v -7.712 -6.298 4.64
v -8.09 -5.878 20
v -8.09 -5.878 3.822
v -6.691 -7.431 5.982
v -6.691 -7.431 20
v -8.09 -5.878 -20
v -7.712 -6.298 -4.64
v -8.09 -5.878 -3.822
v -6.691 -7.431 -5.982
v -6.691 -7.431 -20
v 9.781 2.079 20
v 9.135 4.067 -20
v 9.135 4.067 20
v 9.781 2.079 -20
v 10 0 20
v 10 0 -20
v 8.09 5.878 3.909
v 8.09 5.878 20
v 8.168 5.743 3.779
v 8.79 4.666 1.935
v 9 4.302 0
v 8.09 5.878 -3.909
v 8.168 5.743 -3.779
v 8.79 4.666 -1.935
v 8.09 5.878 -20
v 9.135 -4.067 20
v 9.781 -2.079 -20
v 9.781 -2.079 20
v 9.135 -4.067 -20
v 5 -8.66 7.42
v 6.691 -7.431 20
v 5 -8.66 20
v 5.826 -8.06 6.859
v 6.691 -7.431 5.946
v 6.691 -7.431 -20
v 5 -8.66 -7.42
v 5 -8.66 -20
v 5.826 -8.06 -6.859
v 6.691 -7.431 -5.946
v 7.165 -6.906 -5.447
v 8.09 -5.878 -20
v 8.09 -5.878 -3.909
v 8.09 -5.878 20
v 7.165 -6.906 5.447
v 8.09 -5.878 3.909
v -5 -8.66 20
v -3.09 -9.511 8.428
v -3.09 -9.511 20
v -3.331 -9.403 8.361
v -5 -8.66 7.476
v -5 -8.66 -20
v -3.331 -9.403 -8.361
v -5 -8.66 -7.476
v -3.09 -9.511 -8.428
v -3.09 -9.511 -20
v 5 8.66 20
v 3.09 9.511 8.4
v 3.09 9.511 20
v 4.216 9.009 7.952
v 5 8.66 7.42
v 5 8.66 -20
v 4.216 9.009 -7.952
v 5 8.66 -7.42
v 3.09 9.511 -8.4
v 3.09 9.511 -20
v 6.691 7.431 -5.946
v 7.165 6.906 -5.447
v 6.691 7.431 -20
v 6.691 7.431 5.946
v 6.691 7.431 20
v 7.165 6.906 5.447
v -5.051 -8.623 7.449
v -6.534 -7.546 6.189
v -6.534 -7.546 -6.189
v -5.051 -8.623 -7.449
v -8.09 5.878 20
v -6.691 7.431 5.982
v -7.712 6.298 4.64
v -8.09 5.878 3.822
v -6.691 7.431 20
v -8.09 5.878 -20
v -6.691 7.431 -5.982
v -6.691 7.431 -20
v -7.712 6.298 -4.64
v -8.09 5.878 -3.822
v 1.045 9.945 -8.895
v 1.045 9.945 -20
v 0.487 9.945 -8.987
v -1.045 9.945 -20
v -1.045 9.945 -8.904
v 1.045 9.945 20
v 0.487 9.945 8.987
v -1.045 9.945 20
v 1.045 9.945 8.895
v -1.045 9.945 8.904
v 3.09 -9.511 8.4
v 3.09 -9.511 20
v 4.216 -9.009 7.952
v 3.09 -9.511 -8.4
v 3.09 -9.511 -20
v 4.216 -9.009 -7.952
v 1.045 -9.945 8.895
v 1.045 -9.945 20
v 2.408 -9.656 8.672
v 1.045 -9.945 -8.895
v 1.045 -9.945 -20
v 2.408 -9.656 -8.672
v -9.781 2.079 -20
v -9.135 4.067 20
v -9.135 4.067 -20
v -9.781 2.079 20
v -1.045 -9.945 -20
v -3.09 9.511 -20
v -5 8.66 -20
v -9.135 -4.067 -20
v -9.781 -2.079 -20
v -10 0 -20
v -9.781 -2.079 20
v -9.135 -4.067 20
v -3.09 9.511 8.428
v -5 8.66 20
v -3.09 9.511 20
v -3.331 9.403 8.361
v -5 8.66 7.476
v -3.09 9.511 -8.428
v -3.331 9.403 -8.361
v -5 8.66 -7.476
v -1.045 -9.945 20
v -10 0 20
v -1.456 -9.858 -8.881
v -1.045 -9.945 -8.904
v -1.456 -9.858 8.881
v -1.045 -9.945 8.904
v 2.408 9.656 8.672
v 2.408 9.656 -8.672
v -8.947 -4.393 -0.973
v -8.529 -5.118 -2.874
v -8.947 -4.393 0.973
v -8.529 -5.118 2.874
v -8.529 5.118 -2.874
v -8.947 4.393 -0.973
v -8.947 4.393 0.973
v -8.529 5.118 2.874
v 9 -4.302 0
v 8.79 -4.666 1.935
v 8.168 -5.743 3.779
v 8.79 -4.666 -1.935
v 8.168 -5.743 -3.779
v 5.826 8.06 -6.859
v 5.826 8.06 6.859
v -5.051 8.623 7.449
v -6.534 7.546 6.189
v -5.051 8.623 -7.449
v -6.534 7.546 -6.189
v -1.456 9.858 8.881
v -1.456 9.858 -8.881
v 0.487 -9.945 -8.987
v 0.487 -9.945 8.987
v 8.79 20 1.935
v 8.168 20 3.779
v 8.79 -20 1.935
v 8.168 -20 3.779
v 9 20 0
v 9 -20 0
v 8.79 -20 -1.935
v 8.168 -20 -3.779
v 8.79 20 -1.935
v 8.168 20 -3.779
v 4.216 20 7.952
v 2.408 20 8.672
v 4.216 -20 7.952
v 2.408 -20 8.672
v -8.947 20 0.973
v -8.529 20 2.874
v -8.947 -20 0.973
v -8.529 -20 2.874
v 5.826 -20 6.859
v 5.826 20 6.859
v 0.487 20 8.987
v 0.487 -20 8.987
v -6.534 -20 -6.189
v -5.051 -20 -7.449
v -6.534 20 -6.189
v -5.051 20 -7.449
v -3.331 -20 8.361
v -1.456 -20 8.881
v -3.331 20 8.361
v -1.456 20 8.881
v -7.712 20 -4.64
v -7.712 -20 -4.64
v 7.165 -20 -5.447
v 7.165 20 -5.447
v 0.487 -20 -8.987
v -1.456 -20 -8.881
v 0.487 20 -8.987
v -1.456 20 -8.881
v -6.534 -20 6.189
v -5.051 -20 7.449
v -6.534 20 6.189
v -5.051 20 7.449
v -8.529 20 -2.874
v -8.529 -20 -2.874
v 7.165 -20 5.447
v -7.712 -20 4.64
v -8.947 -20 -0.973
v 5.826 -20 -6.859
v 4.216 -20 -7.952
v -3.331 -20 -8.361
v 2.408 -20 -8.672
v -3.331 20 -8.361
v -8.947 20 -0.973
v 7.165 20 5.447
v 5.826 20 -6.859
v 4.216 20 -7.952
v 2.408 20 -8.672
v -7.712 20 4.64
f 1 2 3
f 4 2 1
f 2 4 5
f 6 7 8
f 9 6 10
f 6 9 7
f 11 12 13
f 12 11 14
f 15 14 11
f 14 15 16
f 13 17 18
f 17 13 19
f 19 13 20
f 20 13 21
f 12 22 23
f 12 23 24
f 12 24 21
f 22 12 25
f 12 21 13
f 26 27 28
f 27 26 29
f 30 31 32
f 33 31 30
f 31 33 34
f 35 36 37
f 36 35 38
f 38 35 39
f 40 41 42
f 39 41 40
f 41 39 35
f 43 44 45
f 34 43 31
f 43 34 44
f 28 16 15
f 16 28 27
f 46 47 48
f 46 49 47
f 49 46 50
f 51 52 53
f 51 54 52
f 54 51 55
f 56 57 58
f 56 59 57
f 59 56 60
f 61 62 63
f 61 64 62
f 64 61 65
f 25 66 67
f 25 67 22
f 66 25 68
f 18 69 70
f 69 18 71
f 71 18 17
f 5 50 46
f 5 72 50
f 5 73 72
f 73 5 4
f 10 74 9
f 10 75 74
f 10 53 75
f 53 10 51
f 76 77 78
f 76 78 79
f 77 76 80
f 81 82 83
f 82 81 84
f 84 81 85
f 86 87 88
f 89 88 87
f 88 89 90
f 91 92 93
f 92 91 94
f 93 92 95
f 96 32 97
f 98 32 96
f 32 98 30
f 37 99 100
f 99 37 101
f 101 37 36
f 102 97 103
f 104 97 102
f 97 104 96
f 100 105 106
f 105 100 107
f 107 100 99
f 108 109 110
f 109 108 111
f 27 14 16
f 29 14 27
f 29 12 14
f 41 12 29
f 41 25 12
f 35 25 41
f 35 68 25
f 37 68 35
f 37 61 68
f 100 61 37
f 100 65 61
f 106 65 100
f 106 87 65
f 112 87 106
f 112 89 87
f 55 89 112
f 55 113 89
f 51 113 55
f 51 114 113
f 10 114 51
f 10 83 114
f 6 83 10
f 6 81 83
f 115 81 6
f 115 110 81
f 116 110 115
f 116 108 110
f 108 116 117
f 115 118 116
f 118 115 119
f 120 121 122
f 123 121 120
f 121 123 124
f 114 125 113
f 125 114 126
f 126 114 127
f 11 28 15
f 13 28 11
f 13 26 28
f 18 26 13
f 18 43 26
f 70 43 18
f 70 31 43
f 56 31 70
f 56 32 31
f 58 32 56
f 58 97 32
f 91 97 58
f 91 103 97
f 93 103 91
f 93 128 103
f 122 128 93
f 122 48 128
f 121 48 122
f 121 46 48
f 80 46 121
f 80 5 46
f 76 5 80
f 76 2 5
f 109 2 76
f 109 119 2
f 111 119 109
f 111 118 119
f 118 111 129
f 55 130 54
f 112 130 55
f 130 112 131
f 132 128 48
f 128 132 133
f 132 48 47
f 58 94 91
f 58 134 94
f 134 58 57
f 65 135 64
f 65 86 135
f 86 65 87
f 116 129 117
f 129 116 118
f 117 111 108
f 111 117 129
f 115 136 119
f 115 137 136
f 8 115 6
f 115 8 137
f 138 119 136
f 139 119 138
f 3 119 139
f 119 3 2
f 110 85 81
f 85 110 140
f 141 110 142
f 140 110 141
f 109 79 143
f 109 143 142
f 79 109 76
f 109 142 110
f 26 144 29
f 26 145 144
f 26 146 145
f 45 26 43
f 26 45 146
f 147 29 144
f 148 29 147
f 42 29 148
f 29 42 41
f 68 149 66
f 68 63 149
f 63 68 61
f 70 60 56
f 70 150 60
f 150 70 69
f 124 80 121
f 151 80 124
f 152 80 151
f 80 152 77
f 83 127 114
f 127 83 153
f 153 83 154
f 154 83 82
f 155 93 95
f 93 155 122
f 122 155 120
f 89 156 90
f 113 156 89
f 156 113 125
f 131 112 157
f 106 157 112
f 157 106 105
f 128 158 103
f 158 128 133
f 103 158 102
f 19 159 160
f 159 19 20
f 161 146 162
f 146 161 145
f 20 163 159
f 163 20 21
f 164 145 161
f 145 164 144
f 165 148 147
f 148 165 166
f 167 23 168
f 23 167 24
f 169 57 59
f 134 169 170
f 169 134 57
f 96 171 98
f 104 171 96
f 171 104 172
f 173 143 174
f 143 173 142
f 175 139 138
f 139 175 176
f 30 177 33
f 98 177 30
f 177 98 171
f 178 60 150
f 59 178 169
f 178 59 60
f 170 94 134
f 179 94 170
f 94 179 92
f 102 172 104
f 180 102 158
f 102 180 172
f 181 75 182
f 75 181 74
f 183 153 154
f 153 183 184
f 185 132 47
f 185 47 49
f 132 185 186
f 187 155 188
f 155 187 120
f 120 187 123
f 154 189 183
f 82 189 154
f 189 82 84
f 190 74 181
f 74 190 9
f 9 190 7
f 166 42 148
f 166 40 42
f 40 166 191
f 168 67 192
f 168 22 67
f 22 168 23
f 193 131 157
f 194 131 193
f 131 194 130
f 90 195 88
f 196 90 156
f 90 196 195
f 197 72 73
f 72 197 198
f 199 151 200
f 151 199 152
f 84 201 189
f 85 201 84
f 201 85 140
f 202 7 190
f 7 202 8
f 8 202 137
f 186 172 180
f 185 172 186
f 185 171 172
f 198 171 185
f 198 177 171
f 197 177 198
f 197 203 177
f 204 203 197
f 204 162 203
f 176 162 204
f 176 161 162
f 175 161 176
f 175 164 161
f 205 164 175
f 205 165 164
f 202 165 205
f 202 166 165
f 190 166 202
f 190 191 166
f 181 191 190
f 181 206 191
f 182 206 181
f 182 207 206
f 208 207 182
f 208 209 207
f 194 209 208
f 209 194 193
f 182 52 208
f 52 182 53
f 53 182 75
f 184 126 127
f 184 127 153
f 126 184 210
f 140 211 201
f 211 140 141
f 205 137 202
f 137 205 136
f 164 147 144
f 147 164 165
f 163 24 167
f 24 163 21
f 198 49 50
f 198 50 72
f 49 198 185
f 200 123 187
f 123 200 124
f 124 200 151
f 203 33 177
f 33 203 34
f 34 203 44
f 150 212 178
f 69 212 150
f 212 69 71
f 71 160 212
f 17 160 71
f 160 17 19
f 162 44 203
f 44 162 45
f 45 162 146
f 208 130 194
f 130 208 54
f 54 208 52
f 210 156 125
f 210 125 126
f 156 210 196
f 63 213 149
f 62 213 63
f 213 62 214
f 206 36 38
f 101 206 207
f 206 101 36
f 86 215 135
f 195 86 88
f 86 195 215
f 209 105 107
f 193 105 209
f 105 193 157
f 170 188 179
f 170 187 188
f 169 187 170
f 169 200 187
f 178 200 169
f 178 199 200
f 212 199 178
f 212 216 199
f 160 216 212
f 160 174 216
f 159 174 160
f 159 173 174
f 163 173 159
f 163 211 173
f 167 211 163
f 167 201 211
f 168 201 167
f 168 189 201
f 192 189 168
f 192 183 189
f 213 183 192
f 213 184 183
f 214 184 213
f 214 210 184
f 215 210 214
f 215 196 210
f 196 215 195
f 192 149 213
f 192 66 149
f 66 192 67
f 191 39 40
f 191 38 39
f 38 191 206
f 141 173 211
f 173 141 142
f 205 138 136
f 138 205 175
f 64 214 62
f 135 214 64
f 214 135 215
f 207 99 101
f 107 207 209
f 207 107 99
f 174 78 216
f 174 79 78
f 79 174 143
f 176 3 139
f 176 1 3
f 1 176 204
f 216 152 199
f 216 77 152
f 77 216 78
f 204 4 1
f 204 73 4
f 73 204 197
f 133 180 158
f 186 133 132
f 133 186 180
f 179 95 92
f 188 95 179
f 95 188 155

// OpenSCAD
union() {
  cylinder(h = 40, r = 10, center = true);
  rotate([90, 0, 0])
    cylinder (h = 40, r = 9, center = true);
}
